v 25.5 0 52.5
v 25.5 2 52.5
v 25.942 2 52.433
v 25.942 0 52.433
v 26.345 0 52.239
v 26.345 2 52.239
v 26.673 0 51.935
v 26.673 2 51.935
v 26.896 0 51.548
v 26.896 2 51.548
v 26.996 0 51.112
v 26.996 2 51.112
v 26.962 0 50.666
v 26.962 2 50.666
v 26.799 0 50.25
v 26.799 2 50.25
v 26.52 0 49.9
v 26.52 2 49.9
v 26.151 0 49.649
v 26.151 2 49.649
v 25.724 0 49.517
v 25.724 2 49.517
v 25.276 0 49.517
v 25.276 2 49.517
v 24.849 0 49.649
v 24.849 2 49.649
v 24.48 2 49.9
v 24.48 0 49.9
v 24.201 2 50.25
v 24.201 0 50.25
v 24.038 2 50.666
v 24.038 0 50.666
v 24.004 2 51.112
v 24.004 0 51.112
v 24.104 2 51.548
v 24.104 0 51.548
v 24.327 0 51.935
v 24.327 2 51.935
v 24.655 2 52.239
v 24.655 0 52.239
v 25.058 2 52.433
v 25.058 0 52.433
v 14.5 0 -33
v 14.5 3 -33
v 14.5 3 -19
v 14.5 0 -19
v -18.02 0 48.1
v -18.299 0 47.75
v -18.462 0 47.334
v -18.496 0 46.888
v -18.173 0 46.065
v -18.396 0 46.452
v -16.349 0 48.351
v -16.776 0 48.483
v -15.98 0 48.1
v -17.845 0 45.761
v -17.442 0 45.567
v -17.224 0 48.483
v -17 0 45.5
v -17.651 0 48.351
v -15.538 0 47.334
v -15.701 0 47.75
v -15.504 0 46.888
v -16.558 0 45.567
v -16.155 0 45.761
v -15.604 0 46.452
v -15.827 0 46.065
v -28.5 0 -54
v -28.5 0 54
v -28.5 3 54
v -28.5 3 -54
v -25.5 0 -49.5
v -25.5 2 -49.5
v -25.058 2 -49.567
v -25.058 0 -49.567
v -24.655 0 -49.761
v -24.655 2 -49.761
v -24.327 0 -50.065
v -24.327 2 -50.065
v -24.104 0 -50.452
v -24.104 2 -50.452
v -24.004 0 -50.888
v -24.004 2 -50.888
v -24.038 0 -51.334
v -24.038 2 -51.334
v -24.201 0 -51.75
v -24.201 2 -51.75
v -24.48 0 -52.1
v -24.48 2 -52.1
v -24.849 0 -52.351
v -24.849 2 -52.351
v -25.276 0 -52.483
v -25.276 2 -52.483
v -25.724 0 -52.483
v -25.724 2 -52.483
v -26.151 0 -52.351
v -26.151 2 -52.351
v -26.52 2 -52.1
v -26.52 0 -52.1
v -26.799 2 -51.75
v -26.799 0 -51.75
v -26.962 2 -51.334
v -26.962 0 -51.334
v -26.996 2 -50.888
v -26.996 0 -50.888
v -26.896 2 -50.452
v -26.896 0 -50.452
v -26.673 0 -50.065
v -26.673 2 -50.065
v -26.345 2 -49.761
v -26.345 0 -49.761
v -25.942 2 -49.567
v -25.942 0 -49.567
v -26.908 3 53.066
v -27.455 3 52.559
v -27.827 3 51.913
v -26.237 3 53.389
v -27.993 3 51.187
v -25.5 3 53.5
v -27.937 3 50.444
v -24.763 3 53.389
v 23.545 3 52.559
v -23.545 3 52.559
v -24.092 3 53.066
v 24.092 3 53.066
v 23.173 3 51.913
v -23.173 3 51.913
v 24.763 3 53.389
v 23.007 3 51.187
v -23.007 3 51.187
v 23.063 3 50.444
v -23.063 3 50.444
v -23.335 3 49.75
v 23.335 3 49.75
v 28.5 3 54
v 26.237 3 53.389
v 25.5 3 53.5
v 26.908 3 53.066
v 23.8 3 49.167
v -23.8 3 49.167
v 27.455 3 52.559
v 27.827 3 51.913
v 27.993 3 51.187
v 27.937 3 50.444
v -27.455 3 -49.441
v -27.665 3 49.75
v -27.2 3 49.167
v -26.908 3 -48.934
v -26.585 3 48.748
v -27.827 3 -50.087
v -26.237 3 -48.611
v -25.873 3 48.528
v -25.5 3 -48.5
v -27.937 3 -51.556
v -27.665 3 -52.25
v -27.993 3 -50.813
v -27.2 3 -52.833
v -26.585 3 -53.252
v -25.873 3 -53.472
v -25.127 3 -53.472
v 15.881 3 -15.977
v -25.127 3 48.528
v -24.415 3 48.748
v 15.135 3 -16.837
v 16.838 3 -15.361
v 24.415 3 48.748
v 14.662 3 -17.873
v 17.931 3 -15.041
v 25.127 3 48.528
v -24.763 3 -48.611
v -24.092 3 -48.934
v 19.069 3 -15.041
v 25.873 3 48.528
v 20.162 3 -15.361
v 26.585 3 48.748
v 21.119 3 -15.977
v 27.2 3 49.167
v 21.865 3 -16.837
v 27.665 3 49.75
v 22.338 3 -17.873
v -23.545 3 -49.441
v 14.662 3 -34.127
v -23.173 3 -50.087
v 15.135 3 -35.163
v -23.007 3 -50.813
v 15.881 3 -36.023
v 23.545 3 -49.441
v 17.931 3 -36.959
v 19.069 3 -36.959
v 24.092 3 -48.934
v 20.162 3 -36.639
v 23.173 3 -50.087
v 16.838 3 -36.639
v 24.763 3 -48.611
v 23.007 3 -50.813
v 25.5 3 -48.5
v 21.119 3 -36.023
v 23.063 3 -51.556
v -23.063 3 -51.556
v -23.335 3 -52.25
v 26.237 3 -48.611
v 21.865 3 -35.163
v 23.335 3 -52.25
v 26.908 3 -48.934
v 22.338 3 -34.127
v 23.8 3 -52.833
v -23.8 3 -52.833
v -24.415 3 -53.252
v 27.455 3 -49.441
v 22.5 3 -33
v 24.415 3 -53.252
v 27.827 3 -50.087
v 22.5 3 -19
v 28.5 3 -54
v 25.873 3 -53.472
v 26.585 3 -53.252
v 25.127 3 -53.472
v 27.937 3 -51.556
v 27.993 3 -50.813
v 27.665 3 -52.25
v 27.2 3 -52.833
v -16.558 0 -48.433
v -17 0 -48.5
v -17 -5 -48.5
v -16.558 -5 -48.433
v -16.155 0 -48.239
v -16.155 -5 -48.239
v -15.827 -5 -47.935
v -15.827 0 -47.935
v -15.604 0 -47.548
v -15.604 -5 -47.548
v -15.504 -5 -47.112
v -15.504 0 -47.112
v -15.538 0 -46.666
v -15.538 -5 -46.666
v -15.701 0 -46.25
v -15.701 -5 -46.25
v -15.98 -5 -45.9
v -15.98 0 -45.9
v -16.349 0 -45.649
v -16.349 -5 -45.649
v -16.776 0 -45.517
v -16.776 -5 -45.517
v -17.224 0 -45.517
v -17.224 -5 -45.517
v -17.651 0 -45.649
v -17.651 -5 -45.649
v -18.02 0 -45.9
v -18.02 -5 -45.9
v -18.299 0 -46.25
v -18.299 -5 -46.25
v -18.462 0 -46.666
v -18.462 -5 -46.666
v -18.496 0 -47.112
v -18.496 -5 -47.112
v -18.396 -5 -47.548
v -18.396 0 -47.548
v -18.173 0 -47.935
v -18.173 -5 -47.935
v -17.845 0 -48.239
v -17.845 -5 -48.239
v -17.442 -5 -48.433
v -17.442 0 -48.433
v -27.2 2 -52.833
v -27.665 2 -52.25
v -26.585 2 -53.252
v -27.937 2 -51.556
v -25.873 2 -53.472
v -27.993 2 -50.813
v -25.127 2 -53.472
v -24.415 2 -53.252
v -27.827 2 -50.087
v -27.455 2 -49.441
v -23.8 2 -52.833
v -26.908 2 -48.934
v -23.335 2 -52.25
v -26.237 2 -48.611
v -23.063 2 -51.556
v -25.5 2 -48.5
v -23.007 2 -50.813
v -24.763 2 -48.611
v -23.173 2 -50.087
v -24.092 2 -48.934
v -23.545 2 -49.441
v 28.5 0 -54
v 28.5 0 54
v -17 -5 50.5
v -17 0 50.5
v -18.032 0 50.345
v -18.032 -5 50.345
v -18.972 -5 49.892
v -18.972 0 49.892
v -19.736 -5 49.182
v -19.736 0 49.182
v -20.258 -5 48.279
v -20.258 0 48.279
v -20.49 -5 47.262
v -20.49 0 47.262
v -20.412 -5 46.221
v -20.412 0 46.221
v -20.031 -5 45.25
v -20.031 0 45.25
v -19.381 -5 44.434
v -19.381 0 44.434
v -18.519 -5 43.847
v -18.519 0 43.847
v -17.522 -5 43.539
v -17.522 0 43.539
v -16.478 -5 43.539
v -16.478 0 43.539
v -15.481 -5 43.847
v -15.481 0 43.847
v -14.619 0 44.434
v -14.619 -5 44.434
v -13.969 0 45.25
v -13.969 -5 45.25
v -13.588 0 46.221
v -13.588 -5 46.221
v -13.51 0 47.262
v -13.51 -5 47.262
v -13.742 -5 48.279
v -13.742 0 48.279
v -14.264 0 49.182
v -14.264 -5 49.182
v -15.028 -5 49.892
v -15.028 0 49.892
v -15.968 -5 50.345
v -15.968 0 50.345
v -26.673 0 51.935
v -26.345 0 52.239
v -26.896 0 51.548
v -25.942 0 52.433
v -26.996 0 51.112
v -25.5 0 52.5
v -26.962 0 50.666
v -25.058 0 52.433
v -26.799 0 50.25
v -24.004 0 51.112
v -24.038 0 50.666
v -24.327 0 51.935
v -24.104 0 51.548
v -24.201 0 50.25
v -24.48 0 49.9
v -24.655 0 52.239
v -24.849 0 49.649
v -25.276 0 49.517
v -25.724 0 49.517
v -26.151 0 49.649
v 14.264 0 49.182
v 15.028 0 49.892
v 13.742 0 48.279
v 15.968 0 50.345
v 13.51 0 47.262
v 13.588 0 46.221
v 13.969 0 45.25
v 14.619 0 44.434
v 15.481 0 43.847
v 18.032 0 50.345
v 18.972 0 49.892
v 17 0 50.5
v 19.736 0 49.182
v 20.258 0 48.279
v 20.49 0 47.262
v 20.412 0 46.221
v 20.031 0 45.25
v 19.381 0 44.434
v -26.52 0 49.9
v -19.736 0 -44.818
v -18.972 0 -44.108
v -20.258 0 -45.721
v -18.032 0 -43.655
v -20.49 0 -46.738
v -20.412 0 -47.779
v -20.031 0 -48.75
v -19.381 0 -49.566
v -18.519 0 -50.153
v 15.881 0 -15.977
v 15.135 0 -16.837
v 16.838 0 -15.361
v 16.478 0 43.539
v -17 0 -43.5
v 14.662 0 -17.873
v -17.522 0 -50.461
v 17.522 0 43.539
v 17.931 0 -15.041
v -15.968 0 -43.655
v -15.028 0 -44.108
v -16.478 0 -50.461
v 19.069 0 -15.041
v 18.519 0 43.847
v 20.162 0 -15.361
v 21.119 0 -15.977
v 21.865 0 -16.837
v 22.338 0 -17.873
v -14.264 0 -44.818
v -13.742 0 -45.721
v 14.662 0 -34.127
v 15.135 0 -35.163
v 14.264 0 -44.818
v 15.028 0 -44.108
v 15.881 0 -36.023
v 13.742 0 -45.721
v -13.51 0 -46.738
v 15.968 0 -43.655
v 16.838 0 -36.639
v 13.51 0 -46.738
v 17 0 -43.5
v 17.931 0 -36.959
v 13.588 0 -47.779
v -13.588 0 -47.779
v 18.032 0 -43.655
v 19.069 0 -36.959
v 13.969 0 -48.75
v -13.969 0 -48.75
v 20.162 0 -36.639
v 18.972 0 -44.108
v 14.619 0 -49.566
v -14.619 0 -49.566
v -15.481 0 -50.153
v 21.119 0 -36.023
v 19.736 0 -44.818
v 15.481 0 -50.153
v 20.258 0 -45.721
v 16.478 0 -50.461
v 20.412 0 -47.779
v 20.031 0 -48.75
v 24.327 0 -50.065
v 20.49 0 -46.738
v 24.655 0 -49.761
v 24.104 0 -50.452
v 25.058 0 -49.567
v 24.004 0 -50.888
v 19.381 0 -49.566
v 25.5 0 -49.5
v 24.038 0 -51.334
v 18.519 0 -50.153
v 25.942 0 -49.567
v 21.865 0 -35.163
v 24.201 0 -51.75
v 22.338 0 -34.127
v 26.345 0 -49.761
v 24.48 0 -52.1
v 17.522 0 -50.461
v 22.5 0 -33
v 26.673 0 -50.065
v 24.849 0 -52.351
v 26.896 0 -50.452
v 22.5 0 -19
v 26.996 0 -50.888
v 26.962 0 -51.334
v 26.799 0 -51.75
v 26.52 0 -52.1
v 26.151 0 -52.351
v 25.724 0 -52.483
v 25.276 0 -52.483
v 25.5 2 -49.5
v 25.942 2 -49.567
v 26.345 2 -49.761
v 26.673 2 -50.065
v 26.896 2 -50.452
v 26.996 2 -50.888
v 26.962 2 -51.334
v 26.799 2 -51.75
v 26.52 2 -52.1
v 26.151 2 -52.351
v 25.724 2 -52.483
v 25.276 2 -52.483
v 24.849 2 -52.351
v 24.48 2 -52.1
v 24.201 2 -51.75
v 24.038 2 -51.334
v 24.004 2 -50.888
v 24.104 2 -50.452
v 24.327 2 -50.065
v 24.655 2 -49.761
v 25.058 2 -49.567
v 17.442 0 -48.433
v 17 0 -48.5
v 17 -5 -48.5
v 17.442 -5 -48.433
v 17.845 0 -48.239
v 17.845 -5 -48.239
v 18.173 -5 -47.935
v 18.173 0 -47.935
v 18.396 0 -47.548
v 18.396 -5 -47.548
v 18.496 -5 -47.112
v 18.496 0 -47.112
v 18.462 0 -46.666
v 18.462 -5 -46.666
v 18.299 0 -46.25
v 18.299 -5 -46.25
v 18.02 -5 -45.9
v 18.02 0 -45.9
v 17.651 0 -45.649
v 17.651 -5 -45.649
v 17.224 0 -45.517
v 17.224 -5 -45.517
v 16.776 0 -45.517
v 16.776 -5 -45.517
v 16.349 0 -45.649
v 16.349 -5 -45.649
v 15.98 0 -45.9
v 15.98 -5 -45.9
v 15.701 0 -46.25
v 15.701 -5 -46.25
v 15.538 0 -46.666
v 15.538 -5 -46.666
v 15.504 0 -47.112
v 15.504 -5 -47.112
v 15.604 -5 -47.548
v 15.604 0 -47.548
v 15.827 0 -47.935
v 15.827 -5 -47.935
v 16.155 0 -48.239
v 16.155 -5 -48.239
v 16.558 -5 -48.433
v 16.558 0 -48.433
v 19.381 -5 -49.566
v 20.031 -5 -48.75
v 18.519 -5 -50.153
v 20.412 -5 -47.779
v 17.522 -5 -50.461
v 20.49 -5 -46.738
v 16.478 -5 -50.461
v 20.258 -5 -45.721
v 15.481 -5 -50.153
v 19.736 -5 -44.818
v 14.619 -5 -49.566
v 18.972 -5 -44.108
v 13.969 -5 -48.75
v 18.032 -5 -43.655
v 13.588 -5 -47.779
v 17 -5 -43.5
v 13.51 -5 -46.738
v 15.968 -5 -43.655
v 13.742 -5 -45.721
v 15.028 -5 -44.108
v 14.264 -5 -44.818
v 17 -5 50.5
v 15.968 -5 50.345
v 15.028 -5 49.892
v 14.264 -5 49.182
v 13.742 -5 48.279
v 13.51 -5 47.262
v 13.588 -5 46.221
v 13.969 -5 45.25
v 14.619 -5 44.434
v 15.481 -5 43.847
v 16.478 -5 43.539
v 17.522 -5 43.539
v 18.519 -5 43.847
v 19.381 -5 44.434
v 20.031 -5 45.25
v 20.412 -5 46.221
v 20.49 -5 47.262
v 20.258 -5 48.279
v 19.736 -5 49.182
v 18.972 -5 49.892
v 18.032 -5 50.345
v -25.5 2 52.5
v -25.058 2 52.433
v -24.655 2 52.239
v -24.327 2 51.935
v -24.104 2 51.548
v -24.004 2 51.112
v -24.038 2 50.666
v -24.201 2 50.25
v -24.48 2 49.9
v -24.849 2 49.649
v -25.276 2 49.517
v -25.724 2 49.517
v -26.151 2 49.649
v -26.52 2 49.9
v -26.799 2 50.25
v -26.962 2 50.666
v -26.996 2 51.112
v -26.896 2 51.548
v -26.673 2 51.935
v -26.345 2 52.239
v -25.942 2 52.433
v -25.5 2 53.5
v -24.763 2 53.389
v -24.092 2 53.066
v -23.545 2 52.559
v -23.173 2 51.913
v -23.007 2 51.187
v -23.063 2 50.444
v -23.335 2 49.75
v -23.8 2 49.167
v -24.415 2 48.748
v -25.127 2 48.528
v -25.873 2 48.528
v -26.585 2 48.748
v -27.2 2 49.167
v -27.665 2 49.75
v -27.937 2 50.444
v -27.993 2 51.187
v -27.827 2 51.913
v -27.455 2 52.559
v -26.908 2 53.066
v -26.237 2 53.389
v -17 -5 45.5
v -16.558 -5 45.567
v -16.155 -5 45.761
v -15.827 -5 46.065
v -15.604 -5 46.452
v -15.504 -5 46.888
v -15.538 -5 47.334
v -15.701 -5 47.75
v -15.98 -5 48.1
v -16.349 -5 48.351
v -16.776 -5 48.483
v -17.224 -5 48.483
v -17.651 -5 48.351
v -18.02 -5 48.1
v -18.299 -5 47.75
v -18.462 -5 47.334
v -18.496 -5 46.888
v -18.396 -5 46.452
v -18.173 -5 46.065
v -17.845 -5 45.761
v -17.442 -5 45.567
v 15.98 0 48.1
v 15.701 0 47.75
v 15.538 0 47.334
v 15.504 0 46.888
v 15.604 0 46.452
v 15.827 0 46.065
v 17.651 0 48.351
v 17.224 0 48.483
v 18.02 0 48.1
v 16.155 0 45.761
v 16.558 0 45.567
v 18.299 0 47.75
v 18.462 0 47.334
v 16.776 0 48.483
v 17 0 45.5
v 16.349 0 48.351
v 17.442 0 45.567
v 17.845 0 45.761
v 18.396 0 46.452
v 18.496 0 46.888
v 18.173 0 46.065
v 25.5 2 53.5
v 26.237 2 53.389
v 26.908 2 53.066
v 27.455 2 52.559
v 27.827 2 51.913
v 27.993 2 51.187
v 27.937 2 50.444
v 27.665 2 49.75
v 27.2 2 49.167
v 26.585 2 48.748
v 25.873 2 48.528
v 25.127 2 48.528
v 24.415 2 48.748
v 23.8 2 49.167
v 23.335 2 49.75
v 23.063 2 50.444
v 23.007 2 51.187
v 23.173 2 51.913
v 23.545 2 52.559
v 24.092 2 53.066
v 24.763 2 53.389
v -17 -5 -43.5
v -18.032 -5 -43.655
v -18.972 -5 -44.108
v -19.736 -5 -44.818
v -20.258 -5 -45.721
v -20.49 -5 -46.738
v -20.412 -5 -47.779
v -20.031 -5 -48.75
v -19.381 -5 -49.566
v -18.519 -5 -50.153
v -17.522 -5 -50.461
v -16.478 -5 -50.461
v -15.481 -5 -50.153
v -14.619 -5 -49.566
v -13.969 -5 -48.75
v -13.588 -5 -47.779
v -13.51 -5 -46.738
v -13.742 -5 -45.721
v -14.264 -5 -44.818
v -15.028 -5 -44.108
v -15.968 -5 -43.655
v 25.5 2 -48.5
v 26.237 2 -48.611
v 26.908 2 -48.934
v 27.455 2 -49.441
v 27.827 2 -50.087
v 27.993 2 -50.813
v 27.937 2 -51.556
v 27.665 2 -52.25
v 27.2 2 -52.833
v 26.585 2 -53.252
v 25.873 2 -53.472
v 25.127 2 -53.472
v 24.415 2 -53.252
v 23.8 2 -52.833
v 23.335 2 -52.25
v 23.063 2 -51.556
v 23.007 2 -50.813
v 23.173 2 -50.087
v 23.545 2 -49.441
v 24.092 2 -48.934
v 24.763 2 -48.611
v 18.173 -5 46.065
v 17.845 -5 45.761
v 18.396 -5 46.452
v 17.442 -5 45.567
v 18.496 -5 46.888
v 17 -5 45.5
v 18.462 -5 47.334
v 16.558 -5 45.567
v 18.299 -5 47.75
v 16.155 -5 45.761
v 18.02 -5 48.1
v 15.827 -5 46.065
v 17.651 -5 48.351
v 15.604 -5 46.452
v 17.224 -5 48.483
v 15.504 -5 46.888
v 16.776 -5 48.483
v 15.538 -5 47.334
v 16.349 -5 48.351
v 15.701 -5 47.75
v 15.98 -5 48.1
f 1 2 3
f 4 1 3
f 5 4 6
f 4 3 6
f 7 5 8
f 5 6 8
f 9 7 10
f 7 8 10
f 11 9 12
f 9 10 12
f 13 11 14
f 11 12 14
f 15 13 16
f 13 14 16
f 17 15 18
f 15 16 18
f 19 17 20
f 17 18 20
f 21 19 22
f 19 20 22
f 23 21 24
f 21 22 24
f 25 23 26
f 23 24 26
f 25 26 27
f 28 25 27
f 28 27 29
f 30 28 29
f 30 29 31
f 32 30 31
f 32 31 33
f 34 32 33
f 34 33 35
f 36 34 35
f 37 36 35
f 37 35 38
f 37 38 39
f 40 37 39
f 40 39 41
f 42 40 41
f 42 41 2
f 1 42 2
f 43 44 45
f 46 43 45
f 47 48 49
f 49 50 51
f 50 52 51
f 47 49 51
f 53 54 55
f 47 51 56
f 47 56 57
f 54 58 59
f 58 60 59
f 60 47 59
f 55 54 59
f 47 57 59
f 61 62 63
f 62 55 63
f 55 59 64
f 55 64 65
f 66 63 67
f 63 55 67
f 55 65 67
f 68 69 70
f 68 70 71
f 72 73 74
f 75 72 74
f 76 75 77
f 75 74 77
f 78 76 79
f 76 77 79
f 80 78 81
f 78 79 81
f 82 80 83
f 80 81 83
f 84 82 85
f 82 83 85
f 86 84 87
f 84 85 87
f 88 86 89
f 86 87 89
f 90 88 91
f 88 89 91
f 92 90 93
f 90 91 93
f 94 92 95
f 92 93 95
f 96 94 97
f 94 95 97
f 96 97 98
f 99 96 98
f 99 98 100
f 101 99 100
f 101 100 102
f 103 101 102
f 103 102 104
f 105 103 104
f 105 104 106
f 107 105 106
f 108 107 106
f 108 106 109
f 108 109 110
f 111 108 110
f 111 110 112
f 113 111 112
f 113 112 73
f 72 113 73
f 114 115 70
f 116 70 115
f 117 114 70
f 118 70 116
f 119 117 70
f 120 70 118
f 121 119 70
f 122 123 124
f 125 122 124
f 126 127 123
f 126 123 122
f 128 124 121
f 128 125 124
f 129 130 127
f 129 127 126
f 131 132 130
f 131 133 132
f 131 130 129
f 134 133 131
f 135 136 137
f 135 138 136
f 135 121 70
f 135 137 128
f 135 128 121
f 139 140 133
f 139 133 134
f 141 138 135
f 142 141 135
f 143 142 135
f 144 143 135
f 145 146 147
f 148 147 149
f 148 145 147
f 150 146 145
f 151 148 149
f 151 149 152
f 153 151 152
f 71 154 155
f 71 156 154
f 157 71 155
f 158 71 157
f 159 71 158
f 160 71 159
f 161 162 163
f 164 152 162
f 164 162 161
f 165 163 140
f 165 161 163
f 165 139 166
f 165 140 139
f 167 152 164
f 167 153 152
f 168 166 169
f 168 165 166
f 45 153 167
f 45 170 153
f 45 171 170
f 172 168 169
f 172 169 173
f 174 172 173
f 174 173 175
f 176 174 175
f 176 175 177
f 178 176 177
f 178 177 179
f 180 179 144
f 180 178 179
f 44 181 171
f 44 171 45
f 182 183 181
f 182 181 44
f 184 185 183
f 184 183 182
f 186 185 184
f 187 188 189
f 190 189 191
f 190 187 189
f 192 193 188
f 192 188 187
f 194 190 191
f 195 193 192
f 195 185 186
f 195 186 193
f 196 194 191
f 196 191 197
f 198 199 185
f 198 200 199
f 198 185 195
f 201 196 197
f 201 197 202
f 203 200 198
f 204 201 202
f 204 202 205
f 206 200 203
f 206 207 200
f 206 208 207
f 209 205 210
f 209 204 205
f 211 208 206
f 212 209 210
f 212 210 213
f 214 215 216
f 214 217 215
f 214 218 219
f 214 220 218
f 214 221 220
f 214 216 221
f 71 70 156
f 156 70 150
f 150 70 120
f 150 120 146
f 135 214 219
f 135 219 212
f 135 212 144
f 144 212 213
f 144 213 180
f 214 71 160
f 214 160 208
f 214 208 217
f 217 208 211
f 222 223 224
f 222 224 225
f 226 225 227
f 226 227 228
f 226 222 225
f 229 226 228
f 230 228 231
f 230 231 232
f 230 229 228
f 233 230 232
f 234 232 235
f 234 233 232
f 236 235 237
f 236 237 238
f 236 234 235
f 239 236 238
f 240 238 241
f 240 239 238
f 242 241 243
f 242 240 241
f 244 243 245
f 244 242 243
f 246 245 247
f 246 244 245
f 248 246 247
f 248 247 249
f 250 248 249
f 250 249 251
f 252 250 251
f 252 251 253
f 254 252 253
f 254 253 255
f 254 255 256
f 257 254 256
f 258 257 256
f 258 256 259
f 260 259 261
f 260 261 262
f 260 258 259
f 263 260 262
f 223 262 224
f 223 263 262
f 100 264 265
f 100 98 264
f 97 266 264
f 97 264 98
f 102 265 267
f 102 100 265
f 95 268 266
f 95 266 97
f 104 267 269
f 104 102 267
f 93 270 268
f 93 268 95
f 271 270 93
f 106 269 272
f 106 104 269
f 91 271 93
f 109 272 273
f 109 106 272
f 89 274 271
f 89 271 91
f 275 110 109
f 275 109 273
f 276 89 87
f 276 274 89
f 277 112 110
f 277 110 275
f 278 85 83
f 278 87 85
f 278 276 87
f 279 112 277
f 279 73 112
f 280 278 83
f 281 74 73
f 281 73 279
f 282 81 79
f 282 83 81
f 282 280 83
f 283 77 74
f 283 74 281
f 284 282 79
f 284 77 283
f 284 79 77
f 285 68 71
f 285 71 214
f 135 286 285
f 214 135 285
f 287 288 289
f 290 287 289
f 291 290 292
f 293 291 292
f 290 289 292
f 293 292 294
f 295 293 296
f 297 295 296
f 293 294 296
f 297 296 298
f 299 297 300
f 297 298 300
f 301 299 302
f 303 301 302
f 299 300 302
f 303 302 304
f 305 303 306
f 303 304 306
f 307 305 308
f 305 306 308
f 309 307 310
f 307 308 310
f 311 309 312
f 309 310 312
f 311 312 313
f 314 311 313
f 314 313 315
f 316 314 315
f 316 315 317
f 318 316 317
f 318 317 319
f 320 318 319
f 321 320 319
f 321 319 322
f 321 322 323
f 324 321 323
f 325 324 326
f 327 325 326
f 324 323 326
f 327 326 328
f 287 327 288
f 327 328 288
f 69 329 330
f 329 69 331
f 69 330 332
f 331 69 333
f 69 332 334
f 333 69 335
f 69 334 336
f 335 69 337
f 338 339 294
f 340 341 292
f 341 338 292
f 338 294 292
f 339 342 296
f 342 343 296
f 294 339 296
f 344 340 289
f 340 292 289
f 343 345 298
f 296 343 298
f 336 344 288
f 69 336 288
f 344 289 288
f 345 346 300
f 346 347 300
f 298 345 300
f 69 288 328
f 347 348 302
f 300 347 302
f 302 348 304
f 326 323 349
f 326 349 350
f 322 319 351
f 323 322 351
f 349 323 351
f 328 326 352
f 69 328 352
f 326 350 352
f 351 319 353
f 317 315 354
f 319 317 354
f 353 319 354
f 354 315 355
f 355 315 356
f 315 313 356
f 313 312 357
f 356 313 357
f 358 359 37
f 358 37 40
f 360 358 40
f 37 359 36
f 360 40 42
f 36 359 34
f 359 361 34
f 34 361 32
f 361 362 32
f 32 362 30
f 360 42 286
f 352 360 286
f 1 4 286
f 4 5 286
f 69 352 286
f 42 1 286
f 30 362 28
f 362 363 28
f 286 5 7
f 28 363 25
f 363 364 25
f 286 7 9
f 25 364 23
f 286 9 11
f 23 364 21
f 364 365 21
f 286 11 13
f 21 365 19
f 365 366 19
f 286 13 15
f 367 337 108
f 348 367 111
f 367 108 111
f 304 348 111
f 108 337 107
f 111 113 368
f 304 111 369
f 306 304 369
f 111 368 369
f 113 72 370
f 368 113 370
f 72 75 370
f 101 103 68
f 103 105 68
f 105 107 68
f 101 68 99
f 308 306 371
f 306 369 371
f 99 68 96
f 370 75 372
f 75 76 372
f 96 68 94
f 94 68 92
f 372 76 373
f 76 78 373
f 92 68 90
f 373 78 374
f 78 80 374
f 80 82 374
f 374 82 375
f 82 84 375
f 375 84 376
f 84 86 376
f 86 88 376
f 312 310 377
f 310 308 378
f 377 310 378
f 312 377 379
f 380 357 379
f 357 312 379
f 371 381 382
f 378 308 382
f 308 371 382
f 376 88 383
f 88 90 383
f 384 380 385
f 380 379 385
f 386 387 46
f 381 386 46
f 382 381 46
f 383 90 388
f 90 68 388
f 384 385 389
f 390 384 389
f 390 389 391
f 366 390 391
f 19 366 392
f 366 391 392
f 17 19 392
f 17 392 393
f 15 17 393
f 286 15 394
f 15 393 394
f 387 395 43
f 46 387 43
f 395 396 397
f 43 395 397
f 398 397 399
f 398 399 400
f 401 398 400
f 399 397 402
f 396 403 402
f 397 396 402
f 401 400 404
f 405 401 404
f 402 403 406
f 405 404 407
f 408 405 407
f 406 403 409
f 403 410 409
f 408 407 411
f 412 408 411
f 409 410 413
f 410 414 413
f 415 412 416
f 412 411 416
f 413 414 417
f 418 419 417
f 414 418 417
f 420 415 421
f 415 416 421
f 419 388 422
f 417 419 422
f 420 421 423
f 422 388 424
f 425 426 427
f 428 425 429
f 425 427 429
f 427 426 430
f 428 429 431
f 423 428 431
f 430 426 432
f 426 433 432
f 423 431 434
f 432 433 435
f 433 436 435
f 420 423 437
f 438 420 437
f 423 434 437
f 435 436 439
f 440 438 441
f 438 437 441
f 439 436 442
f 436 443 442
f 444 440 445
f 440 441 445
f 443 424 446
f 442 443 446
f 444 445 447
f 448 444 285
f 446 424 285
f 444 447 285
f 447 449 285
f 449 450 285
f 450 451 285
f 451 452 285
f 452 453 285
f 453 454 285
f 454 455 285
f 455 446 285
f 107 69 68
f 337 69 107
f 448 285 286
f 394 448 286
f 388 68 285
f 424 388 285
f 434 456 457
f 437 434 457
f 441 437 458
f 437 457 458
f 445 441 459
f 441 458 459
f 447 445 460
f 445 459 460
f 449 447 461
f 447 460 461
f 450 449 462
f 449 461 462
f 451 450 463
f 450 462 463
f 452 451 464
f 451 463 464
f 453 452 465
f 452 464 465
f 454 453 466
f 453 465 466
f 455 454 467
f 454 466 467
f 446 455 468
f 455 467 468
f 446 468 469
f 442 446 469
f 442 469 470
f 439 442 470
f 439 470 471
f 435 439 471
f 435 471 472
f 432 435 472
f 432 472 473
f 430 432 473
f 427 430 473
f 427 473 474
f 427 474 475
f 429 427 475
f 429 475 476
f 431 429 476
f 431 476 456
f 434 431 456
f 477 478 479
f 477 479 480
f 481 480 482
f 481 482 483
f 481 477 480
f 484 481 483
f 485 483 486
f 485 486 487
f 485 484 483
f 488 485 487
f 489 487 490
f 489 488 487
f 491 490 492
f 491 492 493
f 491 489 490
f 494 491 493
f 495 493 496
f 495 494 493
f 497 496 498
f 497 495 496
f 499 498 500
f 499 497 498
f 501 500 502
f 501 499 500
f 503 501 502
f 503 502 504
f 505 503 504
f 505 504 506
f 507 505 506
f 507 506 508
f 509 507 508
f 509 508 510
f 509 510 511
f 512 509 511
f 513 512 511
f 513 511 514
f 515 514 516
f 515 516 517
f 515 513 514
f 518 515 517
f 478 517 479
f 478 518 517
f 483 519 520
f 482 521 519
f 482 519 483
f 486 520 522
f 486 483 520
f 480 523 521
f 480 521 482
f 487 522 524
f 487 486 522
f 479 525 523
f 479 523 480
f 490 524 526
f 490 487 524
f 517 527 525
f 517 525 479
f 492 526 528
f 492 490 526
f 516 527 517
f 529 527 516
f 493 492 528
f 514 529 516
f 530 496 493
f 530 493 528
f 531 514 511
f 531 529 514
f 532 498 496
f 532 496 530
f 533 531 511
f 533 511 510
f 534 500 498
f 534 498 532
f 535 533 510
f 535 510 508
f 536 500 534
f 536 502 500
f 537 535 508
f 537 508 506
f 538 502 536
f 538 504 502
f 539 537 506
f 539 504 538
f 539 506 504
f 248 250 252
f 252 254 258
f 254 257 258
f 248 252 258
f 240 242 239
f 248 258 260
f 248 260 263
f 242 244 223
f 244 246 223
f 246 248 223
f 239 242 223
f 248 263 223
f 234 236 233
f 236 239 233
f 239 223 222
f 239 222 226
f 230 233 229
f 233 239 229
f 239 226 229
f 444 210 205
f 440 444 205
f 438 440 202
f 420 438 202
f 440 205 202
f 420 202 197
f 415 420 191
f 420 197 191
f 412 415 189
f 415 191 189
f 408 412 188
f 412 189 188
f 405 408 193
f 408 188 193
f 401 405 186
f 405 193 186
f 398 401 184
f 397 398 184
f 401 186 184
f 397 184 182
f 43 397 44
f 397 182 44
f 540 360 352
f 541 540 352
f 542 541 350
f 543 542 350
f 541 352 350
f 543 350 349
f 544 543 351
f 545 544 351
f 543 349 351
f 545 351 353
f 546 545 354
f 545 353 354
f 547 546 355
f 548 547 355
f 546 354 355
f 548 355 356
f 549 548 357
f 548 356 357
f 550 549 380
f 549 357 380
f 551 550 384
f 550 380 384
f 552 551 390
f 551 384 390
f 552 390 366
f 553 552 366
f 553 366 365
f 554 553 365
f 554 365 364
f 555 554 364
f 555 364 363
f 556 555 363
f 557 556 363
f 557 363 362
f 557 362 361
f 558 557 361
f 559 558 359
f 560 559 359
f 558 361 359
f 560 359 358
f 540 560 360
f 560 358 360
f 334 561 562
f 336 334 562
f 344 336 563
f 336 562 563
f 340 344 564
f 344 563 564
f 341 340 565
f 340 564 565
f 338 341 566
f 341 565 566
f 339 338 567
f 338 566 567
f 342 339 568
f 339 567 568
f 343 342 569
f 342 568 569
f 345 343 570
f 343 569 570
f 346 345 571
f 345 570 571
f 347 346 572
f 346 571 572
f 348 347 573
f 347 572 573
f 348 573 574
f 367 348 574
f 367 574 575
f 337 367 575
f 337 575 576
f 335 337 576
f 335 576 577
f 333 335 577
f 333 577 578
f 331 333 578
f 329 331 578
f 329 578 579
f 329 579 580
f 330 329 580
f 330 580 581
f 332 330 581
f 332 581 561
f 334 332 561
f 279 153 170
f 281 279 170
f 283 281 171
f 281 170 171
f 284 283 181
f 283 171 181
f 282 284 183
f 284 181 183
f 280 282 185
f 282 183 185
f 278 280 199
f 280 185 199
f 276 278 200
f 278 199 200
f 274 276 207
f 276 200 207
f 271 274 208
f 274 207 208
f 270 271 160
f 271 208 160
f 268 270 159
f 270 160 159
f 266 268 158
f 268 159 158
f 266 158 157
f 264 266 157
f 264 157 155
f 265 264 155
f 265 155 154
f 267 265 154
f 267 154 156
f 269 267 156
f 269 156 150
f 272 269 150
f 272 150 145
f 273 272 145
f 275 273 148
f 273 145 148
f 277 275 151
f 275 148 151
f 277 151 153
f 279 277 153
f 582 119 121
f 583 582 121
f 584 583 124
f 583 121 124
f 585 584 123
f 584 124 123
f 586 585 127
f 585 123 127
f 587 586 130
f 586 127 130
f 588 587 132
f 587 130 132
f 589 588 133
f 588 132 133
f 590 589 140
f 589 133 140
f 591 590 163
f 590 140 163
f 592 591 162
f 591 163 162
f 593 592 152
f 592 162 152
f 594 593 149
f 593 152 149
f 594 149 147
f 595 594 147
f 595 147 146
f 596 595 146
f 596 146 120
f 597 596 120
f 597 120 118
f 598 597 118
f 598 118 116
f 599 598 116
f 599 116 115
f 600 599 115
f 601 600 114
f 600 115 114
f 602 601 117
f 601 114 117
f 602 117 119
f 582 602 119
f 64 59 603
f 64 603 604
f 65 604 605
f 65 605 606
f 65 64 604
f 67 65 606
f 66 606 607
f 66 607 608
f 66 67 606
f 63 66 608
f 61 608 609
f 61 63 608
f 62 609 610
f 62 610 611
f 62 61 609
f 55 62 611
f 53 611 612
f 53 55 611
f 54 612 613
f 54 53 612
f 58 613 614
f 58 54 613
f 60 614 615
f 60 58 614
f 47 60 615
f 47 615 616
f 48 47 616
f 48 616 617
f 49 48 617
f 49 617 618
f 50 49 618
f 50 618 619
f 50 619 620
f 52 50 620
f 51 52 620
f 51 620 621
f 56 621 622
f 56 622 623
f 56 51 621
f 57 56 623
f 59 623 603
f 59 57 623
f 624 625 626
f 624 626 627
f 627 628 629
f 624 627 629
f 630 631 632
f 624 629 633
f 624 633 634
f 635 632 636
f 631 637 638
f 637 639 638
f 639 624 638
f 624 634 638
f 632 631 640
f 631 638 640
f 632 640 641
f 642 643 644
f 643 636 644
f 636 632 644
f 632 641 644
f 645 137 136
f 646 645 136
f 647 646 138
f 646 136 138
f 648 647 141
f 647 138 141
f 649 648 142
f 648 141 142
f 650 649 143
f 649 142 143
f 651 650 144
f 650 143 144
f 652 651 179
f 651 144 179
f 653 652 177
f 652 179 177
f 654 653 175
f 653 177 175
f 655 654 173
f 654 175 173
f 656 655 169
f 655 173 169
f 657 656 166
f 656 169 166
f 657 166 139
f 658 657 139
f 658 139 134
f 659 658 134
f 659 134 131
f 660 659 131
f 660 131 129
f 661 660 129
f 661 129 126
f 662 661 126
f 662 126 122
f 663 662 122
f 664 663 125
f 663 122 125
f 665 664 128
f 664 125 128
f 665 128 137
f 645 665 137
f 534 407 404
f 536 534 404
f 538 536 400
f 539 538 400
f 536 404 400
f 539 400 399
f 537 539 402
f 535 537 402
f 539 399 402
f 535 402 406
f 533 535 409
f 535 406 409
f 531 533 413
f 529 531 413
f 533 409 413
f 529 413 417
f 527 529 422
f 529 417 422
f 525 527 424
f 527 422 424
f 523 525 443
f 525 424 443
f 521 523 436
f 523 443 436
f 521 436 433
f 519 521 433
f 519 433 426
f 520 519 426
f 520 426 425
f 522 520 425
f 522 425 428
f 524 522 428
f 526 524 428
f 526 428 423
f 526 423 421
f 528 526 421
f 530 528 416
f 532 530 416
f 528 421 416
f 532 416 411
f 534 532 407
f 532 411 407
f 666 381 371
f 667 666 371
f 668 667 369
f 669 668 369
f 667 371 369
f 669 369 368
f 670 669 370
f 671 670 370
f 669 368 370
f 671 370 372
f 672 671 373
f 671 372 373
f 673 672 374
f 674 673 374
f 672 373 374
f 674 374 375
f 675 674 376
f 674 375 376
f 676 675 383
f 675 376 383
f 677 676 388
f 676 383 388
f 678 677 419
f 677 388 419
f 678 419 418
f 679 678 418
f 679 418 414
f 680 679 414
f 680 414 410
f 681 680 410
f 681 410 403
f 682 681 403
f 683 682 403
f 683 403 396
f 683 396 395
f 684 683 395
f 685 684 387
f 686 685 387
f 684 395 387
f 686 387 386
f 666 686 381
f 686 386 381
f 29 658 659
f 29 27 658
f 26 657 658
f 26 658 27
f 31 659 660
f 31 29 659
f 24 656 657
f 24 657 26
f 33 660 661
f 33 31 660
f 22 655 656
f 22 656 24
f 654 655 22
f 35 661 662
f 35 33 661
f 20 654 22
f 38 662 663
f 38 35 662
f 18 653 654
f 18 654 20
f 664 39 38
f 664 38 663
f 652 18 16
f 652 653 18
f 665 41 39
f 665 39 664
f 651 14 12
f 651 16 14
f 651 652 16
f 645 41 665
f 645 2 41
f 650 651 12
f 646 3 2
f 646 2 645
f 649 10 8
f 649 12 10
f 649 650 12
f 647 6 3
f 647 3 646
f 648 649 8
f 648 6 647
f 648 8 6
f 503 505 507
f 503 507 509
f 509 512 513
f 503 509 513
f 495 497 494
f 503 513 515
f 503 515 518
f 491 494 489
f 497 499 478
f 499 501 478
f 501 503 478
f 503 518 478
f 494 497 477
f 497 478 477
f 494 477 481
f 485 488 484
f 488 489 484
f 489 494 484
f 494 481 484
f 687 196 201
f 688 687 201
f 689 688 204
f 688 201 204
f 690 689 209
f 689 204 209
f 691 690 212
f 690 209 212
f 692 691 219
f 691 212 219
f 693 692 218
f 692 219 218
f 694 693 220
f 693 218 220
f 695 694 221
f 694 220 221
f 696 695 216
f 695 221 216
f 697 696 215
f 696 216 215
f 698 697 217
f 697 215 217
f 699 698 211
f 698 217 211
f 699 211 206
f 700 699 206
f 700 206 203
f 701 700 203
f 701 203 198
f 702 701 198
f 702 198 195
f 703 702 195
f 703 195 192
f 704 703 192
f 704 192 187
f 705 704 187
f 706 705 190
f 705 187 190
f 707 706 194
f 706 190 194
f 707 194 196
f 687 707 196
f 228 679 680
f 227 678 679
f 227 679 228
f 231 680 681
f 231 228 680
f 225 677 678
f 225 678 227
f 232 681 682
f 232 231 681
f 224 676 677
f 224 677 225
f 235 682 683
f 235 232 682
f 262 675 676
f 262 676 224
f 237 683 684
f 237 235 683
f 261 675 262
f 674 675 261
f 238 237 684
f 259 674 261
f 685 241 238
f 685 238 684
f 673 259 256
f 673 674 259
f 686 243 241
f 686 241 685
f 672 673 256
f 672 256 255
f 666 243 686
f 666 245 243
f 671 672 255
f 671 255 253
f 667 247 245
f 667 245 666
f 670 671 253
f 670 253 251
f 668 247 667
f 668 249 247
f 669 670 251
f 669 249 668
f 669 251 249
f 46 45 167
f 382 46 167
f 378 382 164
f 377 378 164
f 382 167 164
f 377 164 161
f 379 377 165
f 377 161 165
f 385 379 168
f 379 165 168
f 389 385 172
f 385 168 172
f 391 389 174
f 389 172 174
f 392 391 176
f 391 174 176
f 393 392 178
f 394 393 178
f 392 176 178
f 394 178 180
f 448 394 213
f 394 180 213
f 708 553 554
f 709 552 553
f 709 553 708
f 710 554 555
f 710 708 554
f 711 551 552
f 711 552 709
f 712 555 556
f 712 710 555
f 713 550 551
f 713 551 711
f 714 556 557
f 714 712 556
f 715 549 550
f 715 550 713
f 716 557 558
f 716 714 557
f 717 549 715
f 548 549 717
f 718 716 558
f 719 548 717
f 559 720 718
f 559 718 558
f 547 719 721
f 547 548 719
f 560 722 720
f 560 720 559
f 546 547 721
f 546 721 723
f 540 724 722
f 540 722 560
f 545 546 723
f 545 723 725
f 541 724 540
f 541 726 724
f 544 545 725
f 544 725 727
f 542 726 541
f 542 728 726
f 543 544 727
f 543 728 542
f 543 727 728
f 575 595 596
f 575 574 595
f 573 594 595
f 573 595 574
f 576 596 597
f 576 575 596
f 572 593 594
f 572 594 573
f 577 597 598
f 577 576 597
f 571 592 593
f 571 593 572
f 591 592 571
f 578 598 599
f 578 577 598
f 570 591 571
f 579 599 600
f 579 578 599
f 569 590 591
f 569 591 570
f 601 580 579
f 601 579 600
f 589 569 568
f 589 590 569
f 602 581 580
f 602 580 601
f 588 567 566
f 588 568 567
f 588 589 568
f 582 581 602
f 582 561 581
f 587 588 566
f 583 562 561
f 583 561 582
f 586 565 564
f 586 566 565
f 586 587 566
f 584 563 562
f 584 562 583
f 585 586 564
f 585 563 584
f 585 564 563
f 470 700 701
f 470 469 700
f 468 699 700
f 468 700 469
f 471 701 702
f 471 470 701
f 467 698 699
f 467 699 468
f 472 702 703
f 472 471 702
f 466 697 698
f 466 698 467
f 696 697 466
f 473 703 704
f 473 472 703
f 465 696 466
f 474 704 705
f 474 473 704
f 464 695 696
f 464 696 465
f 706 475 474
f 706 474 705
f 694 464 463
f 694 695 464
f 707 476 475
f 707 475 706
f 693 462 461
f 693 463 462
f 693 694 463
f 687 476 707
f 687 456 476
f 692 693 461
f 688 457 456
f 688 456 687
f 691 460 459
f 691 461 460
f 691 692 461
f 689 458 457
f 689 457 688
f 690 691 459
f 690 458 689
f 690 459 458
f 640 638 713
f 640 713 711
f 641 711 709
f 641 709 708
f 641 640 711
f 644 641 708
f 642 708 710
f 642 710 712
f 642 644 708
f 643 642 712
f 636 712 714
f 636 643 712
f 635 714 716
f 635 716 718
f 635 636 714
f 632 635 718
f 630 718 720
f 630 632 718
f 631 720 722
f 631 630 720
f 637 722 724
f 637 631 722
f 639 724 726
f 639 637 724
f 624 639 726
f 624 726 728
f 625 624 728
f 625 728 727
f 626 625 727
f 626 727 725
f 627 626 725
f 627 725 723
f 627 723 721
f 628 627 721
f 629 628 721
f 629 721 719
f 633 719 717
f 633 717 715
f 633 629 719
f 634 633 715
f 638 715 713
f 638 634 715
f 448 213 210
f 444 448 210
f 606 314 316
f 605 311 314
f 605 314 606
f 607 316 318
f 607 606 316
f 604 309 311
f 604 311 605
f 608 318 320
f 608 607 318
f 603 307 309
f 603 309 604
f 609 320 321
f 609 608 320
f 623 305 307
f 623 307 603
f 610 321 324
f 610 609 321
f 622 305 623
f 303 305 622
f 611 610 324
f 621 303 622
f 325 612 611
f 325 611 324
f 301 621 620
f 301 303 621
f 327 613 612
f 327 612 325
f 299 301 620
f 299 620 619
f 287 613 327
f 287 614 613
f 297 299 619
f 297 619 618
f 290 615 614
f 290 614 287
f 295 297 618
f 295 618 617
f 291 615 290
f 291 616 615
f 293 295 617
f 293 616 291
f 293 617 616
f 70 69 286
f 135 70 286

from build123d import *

# Parameters (mm, degrees)
CROQUIS1_W              = 57
CROQUIS1_H              = 108
SALIENTE_EXTRUIR1_DEPTH = 3
CROQUIS2_R              = 1.5
CORTAR_EXTRUIR1_DEPTH   = 3
CROQUIS3_R              = 2.5
CORTAR_EXTRUIR2_DEPTH   = 1
CROQUIS7_R              = 3.5
CROQUIS7_R_2            = 1.5
SALIENTE_EXTRUIR2_DEPTH = 5
CORTAR_EXTRUIR3_DEPTH   = 4


with BuildPart() as part:
    # Croquis1 → Saliente-Extruir1 (new body)
    with BuildSketch(Plane(origin=(0, 0, 0), x_dir=(1, 0, 0), z_dir=(0, 1, 0))):
        Rectangle(CROQUIS1_W, CROQUIS1_H)
    extrude(amount=SALIENTE_EXTRUIR1_DEPTH)

    # Croquis2 → Cortar-Extruir1 (cut)
    with BuildSketch(Plane(origin=(0, 3, 0), x_dir=(1, 0, 0), z_dir=(0, 1, 0))):
        with Locations(Location((-25.5, 51, 0), (0, 0, 270))):
            Circle(CROQUIS2_R)
        with Locations(Location((25.5, 51, 0), (0, 0, 270))):
            Circle(CROQUIS2_R)
        with Locations(Location((25.5, -51, 0), (0, 0, 270))):
            Circle(CROQUIS2_R)
        with Locations(Location((-25.5, -51, 0), (0, 0, 270))):
            Circle(CROQUIS2_R)
    extrude(amount=-CORTAR_EXTRUIR1_DEPTH, mode=Mode.SUBTRACT)

    # Croquis3 → Cortar-Extruir2 (cut)
    with BuildSketch(Plane(origin=(0, 3, 0), x_dir=(1, 0, 0), z_dir=(0, 1, 0))):
        with Locations(Location((-25.5, 51, 0), (0, 0, 270))):
            Circle(CROQUIS3_R)
        with Locations(Location((25.5, 51, 0), (0, 0, 270))):
            Circle(CROQUIS3_R)
        with Locations(Location((25.5, -51, 0), (0, 0, 270))):
            Circle(CROQUIS3_R)
        with Locations(Location((-25.5, -51, 0), (0, 0, 270))):
            Circle(CROQUIS3_R)
    extrude(amount=-CORTAR_EXTRUIR2_DEPTH, mode=Mode.SUBTRACT)

    # Croquis7 → Saliente-Extruir2 (add)
    # profile 1 of 4: a face of its own
    with BuildSketch(Plane.XZ):
        with Locations(Location((-17, 47, 0), (0, 0, 90))):
            Circle(CROQUIS7_R)
        with Locations(Location((-17, 47, 0), (0, 0, 270))):
            Circle(CROQUIS7_R_2, mode=Mode.SUBTRACT)
    # profile 2 of 4: a face of its own
    with BuildSketch(Plane.XZ):
        with Locations(Location((17, 47, 0), (0, 0, 90))):
            Circle(CROQUIS7_R)
        with Locations(Location((17, 47, 0), (0, 0, 270))):
            Circle(CROQUIS7_R_2, mode=Mode.SUBTRACT)
    # profile 3 of 4: a face of its own
    with BuildSketch(Plane.XZ):
        with Locations(Location((17, -47, 0), (0, 0, 90))):
            Circle(CROQUIS7_R)
        with Locations(Location((17, -47, 0), (0, 0, 270))):
            Circle(CROQUIS7_R_2, mode=Mode.SUBTRACT)
    # profile 4 of 4: a face of its own
    with BuildSketch(Plane.XZ):
        with Locations(Location((-17, -47, 0), (0, 0, 90))):
            Circle(CROQUIS7_R)
        with Locations(Location((-17, -47, 0), (0, 0, 270))):
            Circle(CROQUIS7_R_2, mode=Mode.SUBTRACT)
    extrude(amount=SALIENTE_EXTRUIR2_DEPTH)

    # Croquis9 → Cortar-Extruir3 (cut)
    with BuildSketch(Plane(origin=(0, 3, 0), x_dir=(1, 0, 0), z_dir=(0, 1, 0))):
        with BuildLine():
            Line((14.5, 33), (14.5, 19))
            ThreePointArc((14.5, 19), (18.5, 15), (22.5, 19))
            Line((22.5, 19), (22.5, 33))
            ThreePointArc((22.5, 33), (18.5, 37), (14.5, 33))
        make_face()
    extrude(amount=-CORTAR_EXTRUIR3_DEPTH, mode=Mode.SUBTRACT)


solid = part.part
